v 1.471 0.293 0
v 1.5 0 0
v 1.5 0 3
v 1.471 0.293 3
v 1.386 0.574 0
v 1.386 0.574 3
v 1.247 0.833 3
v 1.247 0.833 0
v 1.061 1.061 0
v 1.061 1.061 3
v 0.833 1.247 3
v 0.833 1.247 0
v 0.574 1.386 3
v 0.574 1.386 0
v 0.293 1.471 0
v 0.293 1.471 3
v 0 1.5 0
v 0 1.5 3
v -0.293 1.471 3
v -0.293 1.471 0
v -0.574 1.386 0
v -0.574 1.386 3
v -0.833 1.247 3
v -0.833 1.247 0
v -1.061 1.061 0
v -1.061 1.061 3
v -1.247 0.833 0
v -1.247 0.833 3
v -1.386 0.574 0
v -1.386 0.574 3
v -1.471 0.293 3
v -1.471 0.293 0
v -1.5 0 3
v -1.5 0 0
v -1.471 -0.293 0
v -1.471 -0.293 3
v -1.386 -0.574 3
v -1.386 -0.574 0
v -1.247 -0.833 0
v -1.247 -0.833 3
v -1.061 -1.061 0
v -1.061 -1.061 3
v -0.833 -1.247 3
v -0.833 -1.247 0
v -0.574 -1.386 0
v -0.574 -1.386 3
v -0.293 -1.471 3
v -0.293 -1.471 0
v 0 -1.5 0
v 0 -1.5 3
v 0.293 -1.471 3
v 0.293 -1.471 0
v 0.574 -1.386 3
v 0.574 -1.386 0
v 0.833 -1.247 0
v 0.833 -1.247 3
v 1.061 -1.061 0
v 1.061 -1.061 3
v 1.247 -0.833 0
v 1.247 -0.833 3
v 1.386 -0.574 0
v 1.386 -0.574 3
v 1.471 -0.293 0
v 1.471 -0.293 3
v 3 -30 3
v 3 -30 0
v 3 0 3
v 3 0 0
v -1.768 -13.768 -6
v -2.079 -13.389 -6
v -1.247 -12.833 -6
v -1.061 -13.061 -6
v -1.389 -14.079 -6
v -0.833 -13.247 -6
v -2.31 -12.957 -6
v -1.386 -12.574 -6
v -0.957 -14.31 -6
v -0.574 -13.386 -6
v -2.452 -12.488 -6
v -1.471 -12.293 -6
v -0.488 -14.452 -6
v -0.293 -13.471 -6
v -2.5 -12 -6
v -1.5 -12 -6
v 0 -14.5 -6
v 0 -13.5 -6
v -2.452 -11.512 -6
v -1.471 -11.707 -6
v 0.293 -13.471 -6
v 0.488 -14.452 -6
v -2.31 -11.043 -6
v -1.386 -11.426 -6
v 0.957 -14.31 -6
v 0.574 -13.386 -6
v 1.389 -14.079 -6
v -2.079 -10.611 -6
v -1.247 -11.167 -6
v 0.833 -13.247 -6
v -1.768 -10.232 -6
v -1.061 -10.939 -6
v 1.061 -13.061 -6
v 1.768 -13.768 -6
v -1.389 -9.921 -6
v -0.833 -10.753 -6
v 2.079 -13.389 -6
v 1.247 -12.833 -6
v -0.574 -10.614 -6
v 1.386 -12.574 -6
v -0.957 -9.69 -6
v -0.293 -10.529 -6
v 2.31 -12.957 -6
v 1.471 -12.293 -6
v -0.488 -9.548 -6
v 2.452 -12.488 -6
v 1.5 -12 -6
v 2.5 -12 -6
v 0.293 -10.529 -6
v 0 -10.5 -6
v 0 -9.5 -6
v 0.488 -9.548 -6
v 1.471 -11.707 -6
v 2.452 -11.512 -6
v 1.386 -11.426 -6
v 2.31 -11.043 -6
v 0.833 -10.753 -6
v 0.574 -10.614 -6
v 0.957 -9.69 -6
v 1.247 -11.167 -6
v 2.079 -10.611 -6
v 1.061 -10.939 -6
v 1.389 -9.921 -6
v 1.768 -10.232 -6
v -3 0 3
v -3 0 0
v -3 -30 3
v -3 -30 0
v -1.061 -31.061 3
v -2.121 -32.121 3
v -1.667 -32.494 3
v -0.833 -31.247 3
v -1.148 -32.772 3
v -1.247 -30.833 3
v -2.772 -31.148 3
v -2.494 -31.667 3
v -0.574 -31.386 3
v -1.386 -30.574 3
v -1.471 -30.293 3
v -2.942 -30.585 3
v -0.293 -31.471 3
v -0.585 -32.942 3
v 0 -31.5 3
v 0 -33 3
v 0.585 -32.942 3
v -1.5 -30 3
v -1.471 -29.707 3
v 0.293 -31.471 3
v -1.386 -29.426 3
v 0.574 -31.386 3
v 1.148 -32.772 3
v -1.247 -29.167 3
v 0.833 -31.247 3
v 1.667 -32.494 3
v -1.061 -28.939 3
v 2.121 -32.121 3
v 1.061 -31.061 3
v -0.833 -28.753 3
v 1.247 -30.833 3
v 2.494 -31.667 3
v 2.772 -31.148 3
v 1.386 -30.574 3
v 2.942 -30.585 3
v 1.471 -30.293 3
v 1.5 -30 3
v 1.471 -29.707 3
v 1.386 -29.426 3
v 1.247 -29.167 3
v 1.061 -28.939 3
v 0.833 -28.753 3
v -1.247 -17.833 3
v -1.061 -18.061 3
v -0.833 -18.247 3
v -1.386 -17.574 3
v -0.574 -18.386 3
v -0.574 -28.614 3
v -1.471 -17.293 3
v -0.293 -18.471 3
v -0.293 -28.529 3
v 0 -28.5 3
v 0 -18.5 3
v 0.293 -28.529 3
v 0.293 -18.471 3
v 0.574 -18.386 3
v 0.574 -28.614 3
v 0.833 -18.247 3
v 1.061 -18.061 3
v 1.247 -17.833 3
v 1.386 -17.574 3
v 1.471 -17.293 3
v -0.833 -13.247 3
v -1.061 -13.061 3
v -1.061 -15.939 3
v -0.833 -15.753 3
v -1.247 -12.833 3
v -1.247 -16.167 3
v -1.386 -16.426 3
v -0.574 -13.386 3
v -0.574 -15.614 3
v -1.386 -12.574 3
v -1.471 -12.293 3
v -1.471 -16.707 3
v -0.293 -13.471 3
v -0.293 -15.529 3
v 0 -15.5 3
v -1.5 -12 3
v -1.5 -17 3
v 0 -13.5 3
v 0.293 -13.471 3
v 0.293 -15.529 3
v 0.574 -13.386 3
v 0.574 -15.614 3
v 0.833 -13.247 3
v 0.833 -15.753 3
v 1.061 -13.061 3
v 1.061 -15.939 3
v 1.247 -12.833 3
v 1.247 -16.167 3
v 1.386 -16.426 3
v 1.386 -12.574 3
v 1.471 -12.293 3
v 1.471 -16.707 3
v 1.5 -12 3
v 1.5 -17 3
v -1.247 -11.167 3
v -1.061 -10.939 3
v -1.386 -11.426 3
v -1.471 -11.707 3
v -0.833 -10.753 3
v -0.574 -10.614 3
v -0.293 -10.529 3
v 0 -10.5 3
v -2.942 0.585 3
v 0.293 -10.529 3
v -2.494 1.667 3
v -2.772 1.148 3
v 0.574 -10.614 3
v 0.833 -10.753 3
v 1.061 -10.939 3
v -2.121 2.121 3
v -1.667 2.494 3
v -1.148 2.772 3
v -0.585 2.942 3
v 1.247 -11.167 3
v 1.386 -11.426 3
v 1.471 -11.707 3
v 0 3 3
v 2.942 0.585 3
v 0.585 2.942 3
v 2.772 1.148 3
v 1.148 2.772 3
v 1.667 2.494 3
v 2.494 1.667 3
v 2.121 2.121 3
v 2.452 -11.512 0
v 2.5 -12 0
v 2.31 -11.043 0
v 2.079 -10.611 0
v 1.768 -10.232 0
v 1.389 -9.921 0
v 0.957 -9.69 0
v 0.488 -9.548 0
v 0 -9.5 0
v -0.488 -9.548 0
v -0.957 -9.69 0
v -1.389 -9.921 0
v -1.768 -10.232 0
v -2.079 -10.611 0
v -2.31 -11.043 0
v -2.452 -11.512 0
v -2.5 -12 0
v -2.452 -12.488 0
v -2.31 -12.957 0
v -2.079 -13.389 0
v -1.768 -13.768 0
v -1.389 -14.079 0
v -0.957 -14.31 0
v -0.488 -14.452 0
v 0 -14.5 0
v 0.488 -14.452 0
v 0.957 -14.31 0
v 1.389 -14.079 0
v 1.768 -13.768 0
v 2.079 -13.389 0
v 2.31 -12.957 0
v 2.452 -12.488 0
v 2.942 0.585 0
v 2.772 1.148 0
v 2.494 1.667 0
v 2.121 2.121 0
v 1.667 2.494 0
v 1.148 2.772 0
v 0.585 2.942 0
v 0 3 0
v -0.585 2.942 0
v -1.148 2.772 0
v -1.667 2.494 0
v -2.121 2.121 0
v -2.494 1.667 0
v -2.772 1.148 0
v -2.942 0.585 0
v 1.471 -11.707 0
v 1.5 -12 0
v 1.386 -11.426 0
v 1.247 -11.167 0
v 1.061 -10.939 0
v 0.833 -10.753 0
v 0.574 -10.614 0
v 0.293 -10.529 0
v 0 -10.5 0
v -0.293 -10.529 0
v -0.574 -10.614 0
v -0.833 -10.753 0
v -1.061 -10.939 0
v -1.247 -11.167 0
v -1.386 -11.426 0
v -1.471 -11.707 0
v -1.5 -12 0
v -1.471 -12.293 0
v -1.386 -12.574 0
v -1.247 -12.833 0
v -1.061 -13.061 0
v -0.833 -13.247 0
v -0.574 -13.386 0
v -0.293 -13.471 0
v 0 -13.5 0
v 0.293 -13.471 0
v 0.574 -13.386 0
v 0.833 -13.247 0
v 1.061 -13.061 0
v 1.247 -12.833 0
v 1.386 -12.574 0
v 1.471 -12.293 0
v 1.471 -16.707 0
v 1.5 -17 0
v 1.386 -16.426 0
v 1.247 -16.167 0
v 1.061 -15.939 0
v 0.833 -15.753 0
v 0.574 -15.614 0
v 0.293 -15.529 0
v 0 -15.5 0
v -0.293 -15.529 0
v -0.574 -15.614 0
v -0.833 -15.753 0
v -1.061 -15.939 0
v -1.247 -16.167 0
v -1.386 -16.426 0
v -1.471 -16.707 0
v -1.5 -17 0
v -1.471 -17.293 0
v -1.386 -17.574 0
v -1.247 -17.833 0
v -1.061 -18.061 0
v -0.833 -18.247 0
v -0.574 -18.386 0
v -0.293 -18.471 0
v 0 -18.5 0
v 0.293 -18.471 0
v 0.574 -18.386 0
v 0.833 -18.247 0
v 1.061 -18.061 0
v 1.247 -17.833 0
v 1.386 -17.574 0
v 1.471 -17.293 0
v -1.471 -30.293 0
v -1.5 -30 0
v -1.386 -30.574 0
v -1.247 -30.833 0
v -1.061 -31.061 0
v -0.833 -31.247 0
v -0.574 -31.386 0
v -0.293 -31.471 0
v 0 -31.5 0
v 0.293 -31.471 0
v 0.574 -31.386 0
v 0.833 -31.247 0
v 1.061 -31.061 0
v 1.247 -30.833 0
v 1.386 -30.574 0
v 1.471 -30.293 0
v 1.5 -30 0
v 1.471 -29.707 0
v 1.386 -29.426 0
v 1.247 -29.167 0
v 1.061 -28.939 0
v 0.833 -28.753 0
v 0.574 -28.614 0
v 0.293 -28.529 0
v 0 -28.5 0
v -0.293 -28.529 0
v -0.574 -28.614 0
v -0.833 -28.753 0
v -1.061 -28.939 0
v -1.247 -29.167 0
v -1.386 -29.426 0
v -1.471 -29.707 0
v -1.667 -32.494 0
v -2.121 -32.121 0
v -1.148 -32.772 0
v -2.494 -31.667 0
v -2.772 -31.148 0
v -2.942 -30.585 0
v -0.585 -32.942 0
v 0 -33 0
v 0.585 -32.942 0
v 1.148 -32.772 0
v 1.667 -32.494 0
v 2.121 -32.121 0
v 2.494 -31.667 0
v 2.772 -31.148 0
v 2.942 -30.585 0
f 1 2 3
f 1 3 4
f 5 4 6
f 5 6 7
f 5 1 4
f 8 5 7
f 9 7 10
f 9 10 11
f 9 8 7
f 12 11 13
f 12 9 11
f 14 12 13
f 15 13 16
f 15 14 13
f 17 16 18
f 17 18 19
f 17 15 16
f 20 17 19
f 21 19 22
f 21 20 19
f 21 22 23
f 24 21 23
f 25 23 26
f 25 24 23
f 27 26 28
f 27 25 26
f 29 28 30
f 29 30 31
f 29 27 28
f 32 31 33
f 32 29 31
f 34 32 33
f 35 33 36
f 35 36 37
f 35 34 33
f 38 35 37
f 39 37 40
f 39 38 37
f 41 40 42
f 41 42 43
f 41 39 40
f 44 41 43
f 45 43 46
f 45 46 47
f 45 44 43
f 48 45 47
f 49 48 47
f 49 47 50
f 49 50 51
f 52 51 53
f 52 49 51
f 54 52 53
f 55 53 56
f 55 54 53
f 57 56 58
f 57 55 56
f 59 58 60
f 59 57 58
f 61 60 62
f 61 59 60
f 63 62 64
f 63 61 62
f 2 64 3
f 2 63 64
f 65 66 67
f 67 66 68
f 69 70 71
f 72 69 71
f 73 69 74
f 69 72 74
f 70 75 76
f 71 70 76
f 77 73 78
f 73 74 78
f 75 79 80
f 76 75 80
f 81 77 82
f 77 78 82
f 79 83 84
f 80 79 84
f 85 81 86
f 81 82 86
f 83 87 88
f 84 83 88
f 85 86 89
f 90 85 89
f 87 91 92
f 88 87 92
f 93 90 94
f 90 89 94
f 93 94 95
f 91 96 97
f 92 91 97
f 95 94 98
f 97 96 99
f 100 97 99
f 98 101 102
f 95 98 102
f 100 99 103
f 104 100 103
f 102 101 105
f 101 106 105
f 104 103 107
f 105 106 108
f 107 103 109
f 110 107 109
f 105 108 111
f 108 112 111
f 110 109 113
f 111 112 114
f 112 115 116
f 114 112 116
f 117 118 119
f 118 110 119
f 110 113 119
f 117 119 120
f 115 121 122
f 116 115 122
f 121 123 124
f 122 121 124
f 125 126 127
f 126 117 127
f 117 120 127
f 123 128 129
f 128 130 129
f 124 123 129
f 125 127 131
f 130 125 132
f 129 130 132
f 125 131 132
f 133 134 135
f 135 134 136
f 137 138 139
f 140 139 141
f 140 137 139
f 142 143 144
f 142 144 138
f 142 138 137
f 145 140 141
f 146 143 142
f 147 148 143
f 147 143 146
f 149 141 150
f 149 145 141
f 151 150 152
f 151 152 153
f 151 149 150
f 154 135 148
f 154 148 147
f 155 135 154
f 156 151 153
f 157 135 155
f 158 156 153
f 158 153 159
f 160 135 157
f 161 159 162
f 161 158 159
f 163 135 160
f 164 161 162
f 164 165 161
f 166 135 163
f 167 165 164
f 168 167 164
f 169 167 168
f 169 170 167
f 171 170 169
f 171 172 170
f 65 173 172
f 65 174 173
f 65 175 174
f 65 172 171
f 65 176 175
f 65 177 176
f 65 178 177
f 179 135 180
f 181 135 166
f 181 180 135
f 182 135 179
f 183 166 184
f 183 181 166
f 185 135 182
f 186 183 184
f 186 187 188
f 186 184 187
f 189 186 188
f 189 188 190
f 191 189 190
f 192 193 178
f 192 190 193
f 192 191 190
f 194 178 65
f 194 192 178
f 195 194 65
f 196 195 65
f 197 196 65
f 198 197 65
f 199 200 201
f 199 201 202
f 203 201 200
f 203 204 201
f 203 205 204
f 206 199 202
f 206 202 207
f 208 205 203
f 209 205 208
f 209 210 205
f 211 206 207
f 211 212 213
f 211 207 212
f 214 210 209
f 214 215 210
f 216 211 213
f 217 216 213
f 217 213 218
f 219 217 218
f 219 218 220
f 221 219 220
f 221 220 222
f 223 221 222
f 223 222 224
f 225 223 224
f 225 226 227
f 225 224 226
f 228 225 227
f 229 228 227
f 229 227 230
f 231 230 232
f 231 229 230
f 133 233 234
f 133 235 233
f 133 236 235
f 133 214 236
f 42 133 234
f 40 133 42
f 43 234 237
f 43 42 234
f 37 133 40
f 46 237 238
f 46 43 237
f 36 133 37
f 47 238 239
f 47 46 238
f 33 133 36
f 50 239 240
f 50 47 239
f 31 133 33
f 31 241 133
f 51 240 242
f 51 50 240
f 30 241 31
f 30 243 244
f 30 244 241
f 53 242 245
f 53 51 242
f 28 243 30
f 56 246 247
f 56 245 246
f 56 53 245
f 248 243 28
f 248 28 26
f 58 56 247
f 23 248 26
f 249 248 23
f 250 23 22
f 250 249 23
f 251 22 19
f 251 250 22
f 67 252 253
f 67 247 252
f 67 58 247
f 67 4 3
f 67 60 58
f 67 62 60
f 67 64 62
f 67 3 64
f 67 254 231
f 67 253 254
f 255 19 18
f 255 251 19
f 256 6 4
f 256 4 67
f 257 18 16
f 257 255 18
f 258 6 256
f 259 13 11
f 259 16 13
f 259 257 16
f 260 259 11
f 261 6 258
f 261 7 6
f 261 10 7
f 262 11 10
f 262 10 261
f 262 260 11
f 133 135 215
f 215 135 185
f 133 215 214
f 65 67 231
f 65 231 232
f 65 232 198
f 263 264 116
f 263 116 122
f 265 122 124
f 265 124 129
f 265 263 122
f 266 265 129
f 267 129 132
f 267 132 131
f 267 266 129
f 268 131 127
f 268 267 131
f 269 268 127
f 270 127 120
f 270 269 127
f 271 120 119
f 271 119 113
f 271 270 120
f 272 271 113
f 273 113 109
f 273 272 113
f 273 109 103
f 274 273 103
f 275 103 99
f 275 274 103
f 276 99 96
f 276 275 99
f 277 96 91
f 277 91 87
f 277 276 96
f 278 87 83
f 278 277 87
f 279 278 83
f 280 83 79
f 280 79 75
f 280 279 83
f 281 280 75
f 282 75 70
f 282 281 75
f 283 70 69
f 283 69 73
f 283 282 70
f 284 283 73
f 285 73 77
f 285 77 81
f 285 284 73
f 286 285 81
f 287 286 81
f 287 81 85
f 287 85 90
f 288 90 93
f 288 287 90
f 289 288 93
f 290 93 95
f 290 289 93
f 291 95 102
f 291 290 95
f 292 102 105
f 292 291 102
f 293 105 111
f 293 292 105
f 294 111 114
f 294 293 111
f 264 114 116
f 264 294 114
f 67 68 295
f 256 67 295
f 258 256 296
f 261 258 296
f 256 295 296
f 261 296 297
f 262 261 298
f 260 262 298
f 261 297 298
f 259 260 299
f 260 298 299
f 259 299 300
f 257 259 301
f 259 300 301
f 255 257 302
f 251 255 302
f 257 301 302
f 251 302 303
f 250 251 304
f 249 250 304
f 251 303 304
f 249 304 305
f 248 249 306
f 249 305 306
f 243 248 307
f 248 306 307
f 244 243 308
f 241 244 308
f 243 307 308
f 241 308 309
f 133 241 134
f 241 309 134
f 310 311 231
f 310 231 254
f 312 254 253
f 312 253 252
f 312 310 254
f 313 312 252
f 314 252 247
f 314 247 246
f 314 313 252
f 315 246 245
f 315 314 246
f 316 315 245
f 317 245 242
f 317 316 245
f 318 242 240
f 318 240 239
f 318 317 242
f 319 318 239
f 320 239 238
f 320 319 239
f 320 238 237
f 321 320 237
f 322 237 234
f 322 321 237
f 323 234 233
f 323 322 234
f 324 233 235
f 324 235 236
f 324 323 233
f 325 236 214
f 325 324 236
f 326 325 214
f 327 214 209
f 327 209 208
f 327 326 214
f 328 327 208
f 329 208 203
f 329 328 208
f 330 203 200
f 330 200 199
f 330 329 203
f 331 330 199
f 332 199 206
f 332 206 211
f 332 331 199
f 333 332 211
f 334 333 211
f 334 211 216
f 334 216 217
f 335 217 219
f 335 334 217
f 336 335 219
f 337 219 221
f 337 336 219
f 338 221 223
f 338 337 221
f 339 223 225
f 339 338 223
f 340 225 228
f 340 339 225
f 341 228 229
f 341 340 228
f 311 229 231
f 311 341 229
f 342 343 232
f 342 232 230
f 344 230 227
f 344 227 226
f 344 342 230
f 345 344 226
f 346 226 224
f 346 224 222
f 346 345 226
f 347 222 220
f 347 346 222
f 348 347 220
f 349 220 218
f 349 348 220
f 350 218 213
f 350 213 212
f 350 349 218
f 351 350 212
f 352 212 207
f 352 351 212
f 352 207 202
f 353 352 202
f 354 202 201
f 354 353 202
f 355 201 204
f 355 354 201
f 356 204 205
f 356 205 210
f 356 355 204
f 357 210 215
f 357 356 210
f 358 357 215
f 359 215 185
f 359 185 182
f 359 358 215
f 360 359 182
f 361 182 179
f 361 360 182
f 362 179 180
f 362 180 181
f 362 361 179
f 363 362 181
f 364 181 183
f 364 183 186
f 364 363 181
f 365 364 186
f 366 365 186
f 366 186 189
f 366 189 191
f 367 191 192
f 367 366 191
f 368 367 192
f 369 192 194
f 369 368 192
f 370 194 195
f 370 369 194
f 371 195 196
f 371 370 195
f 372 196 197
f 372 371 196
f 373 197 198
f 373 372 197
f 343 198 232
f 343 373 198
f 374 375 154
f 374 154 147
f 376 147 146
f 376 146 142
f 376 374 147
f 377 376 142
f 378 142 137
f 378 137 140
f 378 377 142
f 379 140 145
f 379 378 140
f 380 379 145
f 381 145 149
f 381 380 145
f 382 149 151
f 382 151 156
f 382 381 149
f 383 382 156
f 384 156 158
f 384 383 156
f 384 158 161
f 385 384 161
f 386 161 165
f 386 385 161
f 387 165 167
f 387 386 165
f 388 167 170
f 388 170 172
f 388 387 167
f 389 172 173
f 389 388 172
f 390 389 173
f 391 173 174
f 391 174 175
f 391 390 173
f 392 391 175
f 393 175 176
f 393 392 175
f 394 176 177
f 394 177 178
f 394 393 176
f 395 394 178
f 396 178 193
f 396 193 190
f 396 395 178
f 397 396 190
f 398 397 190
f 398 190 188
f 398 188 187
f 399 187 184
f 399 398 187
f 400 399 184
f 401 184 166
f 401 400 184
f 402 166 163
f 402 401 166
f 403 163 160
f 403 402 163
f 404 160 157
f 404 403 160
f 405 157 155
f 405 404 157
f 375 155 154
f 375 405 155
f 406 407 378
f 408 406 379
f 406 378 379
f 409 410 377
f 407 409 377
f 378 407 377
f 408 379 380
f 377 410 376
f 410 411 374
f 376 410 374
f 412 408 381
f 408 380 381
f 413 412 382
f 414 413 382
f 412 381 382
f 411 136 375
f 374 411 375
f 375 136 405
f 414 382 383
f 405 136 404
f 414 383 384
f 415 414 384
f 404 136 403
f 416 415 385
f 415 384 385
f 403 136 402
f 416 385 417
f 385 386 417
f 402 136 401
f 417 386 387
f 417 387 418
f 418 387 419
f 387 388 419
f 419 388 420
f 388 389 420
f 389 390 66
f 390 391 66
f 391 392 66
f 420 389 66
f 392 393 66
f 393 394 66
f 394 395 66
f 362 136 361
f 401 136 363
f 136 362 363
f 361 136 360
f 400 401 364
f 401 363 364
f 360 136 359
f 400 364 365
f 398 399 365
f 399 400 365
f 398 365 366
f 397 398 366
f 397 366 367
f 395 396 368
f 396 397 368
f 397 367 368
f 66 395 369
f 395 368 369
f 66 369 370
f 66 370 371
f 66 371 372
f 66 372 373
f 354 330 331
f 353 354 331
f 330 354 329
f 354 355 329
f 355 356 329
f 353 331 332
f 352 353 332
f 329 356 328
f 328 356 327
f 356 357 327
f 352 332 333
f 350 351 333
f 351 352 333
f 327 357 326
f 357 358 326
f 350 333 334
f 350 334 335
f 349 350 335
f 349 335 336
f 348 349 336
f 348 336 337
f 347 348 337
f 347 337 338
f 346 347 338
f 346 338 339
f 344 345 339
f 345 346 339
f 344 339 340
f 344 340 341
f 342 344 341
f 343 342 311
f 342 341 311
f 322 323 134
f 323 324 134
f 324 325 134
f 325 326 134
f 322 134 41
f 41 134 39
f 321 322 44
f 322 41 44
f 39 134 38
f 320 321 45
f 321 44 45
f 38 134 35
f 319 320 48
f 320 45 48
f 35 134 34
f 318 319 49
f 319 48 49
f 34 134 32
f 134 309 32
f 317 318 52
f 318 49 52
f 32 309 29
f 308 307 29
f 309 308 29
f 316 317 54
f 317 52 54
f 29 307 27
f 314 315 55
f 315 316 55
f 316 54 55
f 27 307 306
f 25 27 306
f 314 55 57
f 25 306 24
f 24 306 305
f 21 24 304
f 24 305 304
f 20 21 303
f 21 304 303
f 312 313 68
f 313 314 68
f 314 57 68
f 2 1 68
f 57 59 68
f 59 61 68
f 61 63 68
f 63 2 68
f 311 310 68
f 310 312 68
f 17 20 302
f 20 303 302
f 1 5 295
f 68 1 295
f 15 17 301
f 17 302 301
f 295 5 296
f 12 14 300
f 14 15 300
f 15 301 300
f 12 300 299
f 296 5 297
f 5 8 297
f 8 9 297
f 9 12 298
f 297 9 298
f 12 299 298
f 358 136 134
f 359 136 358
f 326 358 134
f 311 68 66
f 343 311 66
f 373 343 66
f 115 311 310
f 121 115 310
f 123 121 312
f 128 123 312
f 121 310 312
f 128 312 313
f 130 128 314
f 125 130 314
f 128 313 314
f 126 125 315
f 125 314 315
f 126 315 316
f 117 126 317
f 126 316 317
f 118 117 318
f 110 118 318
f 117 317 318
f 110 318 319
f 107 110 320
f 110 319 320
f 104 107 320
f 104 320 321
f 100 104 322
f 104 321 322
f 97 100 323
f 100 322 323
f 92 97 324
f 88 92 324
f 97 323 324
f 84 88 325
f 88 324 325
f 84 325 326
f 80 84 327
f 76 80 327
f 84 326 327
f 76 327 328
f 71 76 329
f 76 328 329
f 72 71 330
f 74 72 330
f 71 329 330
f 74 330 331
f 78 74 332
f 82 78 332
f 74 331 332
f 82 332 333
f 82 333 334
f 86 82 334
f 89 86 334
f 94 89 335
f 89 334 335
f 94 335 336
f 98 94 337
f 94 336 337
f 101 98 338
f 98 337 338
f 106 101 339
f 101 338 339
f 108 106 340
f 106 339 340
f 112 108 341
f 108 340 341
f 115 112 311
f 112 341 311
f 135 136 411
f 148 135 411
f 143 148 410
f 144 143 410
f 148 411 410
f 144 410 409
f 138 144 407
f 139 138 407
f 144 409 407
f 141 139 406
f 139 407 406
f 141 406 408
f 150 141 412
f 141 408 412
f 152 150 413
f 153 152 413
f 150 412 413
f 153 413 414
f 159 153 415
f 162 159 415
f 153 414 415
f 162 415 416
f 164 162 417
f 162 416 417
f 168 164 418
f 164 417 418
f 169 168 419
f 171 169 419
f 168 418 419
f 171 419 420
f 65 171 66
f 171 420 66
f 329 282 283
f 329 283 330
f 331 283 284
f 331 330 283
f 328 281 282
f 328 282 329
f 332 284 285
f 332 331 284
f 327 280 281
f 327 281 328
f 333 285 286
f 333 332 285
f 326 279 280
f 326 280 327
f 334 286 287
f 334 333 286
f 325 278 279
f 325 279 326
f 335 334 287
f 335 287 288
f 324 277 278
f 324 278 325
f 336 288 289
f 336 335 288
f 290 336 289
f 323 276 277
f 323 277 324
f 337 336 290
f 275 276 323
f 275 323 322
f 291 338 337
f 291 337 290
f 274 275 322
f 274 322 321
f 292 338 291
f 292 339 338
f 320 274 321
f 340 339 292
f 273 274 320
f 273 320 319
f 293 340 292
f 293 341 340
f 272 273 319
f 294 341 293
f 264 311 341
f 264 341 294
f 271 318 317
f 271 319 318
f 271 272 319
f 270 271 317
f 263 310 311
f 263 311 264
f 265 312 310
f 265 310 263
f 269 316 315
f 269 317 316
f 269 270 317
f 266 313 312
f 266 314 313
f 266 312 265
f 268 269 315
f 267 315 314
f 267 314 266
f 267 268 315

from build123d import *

# Parameters (mm, degrees)
SKETCH_1_R      = 1.5
EXTRUDE_1_DEPTH = 3
SKETCH_3_R      = 2.5
SKETCH_3_R_2    = 1.5
EXTRUDE_2_DEPTH = 6


with BuildPart() as part:
    # ｽｹｯﾁ1 → ﾎﾞｽ - 押し出し1 (new body)
    with BuildSketch(Plane.XY):
        with BuildLine():
            Line((-3, 0), (-3, -30))
            ThreePointArc((-3, -30), (0, -33), (3, -30))
            Line((3, -30), (3, 0))
            ThreePointArc((3, 0), (0, 3), (-3, 0))
        make_face()
        Circle(SKETCH_1_R, mode=Mode.SUBTRACT)
        with Locations(Location((0, -30, 0), (0, 0, 180))):
            Circle(SKETCH_1_R, mode=Mode.SUBTRACT)
        with Locations((0, -17)):
            Circle(SKETCH_1_R, mode=Mode.SUBTRACT)
        with Locations((0, -12)):
            Circle(SKETCH_1_R, mode=Mode.SUBTRACT)
    extrude(amount=EXTRUDE_1_DEPTH)


with BuildPart() as body_2:
    # ｽｹｯﾁ3 → ﾎﾞｽ - 押し出し2 (new body)
    with BuildSketch(Plane.XY):
        with Locations((0, -12)):
            Circle(SKETCH_3_R)
        with Locations((0, -12)):
            Circle(SKETCH_3_R_2, mode=Mode.SUBTRACT)
    extrude(amount=-EXTRUDE_2_DEPTH)


solid = Compound([part.part, body_2.part])
